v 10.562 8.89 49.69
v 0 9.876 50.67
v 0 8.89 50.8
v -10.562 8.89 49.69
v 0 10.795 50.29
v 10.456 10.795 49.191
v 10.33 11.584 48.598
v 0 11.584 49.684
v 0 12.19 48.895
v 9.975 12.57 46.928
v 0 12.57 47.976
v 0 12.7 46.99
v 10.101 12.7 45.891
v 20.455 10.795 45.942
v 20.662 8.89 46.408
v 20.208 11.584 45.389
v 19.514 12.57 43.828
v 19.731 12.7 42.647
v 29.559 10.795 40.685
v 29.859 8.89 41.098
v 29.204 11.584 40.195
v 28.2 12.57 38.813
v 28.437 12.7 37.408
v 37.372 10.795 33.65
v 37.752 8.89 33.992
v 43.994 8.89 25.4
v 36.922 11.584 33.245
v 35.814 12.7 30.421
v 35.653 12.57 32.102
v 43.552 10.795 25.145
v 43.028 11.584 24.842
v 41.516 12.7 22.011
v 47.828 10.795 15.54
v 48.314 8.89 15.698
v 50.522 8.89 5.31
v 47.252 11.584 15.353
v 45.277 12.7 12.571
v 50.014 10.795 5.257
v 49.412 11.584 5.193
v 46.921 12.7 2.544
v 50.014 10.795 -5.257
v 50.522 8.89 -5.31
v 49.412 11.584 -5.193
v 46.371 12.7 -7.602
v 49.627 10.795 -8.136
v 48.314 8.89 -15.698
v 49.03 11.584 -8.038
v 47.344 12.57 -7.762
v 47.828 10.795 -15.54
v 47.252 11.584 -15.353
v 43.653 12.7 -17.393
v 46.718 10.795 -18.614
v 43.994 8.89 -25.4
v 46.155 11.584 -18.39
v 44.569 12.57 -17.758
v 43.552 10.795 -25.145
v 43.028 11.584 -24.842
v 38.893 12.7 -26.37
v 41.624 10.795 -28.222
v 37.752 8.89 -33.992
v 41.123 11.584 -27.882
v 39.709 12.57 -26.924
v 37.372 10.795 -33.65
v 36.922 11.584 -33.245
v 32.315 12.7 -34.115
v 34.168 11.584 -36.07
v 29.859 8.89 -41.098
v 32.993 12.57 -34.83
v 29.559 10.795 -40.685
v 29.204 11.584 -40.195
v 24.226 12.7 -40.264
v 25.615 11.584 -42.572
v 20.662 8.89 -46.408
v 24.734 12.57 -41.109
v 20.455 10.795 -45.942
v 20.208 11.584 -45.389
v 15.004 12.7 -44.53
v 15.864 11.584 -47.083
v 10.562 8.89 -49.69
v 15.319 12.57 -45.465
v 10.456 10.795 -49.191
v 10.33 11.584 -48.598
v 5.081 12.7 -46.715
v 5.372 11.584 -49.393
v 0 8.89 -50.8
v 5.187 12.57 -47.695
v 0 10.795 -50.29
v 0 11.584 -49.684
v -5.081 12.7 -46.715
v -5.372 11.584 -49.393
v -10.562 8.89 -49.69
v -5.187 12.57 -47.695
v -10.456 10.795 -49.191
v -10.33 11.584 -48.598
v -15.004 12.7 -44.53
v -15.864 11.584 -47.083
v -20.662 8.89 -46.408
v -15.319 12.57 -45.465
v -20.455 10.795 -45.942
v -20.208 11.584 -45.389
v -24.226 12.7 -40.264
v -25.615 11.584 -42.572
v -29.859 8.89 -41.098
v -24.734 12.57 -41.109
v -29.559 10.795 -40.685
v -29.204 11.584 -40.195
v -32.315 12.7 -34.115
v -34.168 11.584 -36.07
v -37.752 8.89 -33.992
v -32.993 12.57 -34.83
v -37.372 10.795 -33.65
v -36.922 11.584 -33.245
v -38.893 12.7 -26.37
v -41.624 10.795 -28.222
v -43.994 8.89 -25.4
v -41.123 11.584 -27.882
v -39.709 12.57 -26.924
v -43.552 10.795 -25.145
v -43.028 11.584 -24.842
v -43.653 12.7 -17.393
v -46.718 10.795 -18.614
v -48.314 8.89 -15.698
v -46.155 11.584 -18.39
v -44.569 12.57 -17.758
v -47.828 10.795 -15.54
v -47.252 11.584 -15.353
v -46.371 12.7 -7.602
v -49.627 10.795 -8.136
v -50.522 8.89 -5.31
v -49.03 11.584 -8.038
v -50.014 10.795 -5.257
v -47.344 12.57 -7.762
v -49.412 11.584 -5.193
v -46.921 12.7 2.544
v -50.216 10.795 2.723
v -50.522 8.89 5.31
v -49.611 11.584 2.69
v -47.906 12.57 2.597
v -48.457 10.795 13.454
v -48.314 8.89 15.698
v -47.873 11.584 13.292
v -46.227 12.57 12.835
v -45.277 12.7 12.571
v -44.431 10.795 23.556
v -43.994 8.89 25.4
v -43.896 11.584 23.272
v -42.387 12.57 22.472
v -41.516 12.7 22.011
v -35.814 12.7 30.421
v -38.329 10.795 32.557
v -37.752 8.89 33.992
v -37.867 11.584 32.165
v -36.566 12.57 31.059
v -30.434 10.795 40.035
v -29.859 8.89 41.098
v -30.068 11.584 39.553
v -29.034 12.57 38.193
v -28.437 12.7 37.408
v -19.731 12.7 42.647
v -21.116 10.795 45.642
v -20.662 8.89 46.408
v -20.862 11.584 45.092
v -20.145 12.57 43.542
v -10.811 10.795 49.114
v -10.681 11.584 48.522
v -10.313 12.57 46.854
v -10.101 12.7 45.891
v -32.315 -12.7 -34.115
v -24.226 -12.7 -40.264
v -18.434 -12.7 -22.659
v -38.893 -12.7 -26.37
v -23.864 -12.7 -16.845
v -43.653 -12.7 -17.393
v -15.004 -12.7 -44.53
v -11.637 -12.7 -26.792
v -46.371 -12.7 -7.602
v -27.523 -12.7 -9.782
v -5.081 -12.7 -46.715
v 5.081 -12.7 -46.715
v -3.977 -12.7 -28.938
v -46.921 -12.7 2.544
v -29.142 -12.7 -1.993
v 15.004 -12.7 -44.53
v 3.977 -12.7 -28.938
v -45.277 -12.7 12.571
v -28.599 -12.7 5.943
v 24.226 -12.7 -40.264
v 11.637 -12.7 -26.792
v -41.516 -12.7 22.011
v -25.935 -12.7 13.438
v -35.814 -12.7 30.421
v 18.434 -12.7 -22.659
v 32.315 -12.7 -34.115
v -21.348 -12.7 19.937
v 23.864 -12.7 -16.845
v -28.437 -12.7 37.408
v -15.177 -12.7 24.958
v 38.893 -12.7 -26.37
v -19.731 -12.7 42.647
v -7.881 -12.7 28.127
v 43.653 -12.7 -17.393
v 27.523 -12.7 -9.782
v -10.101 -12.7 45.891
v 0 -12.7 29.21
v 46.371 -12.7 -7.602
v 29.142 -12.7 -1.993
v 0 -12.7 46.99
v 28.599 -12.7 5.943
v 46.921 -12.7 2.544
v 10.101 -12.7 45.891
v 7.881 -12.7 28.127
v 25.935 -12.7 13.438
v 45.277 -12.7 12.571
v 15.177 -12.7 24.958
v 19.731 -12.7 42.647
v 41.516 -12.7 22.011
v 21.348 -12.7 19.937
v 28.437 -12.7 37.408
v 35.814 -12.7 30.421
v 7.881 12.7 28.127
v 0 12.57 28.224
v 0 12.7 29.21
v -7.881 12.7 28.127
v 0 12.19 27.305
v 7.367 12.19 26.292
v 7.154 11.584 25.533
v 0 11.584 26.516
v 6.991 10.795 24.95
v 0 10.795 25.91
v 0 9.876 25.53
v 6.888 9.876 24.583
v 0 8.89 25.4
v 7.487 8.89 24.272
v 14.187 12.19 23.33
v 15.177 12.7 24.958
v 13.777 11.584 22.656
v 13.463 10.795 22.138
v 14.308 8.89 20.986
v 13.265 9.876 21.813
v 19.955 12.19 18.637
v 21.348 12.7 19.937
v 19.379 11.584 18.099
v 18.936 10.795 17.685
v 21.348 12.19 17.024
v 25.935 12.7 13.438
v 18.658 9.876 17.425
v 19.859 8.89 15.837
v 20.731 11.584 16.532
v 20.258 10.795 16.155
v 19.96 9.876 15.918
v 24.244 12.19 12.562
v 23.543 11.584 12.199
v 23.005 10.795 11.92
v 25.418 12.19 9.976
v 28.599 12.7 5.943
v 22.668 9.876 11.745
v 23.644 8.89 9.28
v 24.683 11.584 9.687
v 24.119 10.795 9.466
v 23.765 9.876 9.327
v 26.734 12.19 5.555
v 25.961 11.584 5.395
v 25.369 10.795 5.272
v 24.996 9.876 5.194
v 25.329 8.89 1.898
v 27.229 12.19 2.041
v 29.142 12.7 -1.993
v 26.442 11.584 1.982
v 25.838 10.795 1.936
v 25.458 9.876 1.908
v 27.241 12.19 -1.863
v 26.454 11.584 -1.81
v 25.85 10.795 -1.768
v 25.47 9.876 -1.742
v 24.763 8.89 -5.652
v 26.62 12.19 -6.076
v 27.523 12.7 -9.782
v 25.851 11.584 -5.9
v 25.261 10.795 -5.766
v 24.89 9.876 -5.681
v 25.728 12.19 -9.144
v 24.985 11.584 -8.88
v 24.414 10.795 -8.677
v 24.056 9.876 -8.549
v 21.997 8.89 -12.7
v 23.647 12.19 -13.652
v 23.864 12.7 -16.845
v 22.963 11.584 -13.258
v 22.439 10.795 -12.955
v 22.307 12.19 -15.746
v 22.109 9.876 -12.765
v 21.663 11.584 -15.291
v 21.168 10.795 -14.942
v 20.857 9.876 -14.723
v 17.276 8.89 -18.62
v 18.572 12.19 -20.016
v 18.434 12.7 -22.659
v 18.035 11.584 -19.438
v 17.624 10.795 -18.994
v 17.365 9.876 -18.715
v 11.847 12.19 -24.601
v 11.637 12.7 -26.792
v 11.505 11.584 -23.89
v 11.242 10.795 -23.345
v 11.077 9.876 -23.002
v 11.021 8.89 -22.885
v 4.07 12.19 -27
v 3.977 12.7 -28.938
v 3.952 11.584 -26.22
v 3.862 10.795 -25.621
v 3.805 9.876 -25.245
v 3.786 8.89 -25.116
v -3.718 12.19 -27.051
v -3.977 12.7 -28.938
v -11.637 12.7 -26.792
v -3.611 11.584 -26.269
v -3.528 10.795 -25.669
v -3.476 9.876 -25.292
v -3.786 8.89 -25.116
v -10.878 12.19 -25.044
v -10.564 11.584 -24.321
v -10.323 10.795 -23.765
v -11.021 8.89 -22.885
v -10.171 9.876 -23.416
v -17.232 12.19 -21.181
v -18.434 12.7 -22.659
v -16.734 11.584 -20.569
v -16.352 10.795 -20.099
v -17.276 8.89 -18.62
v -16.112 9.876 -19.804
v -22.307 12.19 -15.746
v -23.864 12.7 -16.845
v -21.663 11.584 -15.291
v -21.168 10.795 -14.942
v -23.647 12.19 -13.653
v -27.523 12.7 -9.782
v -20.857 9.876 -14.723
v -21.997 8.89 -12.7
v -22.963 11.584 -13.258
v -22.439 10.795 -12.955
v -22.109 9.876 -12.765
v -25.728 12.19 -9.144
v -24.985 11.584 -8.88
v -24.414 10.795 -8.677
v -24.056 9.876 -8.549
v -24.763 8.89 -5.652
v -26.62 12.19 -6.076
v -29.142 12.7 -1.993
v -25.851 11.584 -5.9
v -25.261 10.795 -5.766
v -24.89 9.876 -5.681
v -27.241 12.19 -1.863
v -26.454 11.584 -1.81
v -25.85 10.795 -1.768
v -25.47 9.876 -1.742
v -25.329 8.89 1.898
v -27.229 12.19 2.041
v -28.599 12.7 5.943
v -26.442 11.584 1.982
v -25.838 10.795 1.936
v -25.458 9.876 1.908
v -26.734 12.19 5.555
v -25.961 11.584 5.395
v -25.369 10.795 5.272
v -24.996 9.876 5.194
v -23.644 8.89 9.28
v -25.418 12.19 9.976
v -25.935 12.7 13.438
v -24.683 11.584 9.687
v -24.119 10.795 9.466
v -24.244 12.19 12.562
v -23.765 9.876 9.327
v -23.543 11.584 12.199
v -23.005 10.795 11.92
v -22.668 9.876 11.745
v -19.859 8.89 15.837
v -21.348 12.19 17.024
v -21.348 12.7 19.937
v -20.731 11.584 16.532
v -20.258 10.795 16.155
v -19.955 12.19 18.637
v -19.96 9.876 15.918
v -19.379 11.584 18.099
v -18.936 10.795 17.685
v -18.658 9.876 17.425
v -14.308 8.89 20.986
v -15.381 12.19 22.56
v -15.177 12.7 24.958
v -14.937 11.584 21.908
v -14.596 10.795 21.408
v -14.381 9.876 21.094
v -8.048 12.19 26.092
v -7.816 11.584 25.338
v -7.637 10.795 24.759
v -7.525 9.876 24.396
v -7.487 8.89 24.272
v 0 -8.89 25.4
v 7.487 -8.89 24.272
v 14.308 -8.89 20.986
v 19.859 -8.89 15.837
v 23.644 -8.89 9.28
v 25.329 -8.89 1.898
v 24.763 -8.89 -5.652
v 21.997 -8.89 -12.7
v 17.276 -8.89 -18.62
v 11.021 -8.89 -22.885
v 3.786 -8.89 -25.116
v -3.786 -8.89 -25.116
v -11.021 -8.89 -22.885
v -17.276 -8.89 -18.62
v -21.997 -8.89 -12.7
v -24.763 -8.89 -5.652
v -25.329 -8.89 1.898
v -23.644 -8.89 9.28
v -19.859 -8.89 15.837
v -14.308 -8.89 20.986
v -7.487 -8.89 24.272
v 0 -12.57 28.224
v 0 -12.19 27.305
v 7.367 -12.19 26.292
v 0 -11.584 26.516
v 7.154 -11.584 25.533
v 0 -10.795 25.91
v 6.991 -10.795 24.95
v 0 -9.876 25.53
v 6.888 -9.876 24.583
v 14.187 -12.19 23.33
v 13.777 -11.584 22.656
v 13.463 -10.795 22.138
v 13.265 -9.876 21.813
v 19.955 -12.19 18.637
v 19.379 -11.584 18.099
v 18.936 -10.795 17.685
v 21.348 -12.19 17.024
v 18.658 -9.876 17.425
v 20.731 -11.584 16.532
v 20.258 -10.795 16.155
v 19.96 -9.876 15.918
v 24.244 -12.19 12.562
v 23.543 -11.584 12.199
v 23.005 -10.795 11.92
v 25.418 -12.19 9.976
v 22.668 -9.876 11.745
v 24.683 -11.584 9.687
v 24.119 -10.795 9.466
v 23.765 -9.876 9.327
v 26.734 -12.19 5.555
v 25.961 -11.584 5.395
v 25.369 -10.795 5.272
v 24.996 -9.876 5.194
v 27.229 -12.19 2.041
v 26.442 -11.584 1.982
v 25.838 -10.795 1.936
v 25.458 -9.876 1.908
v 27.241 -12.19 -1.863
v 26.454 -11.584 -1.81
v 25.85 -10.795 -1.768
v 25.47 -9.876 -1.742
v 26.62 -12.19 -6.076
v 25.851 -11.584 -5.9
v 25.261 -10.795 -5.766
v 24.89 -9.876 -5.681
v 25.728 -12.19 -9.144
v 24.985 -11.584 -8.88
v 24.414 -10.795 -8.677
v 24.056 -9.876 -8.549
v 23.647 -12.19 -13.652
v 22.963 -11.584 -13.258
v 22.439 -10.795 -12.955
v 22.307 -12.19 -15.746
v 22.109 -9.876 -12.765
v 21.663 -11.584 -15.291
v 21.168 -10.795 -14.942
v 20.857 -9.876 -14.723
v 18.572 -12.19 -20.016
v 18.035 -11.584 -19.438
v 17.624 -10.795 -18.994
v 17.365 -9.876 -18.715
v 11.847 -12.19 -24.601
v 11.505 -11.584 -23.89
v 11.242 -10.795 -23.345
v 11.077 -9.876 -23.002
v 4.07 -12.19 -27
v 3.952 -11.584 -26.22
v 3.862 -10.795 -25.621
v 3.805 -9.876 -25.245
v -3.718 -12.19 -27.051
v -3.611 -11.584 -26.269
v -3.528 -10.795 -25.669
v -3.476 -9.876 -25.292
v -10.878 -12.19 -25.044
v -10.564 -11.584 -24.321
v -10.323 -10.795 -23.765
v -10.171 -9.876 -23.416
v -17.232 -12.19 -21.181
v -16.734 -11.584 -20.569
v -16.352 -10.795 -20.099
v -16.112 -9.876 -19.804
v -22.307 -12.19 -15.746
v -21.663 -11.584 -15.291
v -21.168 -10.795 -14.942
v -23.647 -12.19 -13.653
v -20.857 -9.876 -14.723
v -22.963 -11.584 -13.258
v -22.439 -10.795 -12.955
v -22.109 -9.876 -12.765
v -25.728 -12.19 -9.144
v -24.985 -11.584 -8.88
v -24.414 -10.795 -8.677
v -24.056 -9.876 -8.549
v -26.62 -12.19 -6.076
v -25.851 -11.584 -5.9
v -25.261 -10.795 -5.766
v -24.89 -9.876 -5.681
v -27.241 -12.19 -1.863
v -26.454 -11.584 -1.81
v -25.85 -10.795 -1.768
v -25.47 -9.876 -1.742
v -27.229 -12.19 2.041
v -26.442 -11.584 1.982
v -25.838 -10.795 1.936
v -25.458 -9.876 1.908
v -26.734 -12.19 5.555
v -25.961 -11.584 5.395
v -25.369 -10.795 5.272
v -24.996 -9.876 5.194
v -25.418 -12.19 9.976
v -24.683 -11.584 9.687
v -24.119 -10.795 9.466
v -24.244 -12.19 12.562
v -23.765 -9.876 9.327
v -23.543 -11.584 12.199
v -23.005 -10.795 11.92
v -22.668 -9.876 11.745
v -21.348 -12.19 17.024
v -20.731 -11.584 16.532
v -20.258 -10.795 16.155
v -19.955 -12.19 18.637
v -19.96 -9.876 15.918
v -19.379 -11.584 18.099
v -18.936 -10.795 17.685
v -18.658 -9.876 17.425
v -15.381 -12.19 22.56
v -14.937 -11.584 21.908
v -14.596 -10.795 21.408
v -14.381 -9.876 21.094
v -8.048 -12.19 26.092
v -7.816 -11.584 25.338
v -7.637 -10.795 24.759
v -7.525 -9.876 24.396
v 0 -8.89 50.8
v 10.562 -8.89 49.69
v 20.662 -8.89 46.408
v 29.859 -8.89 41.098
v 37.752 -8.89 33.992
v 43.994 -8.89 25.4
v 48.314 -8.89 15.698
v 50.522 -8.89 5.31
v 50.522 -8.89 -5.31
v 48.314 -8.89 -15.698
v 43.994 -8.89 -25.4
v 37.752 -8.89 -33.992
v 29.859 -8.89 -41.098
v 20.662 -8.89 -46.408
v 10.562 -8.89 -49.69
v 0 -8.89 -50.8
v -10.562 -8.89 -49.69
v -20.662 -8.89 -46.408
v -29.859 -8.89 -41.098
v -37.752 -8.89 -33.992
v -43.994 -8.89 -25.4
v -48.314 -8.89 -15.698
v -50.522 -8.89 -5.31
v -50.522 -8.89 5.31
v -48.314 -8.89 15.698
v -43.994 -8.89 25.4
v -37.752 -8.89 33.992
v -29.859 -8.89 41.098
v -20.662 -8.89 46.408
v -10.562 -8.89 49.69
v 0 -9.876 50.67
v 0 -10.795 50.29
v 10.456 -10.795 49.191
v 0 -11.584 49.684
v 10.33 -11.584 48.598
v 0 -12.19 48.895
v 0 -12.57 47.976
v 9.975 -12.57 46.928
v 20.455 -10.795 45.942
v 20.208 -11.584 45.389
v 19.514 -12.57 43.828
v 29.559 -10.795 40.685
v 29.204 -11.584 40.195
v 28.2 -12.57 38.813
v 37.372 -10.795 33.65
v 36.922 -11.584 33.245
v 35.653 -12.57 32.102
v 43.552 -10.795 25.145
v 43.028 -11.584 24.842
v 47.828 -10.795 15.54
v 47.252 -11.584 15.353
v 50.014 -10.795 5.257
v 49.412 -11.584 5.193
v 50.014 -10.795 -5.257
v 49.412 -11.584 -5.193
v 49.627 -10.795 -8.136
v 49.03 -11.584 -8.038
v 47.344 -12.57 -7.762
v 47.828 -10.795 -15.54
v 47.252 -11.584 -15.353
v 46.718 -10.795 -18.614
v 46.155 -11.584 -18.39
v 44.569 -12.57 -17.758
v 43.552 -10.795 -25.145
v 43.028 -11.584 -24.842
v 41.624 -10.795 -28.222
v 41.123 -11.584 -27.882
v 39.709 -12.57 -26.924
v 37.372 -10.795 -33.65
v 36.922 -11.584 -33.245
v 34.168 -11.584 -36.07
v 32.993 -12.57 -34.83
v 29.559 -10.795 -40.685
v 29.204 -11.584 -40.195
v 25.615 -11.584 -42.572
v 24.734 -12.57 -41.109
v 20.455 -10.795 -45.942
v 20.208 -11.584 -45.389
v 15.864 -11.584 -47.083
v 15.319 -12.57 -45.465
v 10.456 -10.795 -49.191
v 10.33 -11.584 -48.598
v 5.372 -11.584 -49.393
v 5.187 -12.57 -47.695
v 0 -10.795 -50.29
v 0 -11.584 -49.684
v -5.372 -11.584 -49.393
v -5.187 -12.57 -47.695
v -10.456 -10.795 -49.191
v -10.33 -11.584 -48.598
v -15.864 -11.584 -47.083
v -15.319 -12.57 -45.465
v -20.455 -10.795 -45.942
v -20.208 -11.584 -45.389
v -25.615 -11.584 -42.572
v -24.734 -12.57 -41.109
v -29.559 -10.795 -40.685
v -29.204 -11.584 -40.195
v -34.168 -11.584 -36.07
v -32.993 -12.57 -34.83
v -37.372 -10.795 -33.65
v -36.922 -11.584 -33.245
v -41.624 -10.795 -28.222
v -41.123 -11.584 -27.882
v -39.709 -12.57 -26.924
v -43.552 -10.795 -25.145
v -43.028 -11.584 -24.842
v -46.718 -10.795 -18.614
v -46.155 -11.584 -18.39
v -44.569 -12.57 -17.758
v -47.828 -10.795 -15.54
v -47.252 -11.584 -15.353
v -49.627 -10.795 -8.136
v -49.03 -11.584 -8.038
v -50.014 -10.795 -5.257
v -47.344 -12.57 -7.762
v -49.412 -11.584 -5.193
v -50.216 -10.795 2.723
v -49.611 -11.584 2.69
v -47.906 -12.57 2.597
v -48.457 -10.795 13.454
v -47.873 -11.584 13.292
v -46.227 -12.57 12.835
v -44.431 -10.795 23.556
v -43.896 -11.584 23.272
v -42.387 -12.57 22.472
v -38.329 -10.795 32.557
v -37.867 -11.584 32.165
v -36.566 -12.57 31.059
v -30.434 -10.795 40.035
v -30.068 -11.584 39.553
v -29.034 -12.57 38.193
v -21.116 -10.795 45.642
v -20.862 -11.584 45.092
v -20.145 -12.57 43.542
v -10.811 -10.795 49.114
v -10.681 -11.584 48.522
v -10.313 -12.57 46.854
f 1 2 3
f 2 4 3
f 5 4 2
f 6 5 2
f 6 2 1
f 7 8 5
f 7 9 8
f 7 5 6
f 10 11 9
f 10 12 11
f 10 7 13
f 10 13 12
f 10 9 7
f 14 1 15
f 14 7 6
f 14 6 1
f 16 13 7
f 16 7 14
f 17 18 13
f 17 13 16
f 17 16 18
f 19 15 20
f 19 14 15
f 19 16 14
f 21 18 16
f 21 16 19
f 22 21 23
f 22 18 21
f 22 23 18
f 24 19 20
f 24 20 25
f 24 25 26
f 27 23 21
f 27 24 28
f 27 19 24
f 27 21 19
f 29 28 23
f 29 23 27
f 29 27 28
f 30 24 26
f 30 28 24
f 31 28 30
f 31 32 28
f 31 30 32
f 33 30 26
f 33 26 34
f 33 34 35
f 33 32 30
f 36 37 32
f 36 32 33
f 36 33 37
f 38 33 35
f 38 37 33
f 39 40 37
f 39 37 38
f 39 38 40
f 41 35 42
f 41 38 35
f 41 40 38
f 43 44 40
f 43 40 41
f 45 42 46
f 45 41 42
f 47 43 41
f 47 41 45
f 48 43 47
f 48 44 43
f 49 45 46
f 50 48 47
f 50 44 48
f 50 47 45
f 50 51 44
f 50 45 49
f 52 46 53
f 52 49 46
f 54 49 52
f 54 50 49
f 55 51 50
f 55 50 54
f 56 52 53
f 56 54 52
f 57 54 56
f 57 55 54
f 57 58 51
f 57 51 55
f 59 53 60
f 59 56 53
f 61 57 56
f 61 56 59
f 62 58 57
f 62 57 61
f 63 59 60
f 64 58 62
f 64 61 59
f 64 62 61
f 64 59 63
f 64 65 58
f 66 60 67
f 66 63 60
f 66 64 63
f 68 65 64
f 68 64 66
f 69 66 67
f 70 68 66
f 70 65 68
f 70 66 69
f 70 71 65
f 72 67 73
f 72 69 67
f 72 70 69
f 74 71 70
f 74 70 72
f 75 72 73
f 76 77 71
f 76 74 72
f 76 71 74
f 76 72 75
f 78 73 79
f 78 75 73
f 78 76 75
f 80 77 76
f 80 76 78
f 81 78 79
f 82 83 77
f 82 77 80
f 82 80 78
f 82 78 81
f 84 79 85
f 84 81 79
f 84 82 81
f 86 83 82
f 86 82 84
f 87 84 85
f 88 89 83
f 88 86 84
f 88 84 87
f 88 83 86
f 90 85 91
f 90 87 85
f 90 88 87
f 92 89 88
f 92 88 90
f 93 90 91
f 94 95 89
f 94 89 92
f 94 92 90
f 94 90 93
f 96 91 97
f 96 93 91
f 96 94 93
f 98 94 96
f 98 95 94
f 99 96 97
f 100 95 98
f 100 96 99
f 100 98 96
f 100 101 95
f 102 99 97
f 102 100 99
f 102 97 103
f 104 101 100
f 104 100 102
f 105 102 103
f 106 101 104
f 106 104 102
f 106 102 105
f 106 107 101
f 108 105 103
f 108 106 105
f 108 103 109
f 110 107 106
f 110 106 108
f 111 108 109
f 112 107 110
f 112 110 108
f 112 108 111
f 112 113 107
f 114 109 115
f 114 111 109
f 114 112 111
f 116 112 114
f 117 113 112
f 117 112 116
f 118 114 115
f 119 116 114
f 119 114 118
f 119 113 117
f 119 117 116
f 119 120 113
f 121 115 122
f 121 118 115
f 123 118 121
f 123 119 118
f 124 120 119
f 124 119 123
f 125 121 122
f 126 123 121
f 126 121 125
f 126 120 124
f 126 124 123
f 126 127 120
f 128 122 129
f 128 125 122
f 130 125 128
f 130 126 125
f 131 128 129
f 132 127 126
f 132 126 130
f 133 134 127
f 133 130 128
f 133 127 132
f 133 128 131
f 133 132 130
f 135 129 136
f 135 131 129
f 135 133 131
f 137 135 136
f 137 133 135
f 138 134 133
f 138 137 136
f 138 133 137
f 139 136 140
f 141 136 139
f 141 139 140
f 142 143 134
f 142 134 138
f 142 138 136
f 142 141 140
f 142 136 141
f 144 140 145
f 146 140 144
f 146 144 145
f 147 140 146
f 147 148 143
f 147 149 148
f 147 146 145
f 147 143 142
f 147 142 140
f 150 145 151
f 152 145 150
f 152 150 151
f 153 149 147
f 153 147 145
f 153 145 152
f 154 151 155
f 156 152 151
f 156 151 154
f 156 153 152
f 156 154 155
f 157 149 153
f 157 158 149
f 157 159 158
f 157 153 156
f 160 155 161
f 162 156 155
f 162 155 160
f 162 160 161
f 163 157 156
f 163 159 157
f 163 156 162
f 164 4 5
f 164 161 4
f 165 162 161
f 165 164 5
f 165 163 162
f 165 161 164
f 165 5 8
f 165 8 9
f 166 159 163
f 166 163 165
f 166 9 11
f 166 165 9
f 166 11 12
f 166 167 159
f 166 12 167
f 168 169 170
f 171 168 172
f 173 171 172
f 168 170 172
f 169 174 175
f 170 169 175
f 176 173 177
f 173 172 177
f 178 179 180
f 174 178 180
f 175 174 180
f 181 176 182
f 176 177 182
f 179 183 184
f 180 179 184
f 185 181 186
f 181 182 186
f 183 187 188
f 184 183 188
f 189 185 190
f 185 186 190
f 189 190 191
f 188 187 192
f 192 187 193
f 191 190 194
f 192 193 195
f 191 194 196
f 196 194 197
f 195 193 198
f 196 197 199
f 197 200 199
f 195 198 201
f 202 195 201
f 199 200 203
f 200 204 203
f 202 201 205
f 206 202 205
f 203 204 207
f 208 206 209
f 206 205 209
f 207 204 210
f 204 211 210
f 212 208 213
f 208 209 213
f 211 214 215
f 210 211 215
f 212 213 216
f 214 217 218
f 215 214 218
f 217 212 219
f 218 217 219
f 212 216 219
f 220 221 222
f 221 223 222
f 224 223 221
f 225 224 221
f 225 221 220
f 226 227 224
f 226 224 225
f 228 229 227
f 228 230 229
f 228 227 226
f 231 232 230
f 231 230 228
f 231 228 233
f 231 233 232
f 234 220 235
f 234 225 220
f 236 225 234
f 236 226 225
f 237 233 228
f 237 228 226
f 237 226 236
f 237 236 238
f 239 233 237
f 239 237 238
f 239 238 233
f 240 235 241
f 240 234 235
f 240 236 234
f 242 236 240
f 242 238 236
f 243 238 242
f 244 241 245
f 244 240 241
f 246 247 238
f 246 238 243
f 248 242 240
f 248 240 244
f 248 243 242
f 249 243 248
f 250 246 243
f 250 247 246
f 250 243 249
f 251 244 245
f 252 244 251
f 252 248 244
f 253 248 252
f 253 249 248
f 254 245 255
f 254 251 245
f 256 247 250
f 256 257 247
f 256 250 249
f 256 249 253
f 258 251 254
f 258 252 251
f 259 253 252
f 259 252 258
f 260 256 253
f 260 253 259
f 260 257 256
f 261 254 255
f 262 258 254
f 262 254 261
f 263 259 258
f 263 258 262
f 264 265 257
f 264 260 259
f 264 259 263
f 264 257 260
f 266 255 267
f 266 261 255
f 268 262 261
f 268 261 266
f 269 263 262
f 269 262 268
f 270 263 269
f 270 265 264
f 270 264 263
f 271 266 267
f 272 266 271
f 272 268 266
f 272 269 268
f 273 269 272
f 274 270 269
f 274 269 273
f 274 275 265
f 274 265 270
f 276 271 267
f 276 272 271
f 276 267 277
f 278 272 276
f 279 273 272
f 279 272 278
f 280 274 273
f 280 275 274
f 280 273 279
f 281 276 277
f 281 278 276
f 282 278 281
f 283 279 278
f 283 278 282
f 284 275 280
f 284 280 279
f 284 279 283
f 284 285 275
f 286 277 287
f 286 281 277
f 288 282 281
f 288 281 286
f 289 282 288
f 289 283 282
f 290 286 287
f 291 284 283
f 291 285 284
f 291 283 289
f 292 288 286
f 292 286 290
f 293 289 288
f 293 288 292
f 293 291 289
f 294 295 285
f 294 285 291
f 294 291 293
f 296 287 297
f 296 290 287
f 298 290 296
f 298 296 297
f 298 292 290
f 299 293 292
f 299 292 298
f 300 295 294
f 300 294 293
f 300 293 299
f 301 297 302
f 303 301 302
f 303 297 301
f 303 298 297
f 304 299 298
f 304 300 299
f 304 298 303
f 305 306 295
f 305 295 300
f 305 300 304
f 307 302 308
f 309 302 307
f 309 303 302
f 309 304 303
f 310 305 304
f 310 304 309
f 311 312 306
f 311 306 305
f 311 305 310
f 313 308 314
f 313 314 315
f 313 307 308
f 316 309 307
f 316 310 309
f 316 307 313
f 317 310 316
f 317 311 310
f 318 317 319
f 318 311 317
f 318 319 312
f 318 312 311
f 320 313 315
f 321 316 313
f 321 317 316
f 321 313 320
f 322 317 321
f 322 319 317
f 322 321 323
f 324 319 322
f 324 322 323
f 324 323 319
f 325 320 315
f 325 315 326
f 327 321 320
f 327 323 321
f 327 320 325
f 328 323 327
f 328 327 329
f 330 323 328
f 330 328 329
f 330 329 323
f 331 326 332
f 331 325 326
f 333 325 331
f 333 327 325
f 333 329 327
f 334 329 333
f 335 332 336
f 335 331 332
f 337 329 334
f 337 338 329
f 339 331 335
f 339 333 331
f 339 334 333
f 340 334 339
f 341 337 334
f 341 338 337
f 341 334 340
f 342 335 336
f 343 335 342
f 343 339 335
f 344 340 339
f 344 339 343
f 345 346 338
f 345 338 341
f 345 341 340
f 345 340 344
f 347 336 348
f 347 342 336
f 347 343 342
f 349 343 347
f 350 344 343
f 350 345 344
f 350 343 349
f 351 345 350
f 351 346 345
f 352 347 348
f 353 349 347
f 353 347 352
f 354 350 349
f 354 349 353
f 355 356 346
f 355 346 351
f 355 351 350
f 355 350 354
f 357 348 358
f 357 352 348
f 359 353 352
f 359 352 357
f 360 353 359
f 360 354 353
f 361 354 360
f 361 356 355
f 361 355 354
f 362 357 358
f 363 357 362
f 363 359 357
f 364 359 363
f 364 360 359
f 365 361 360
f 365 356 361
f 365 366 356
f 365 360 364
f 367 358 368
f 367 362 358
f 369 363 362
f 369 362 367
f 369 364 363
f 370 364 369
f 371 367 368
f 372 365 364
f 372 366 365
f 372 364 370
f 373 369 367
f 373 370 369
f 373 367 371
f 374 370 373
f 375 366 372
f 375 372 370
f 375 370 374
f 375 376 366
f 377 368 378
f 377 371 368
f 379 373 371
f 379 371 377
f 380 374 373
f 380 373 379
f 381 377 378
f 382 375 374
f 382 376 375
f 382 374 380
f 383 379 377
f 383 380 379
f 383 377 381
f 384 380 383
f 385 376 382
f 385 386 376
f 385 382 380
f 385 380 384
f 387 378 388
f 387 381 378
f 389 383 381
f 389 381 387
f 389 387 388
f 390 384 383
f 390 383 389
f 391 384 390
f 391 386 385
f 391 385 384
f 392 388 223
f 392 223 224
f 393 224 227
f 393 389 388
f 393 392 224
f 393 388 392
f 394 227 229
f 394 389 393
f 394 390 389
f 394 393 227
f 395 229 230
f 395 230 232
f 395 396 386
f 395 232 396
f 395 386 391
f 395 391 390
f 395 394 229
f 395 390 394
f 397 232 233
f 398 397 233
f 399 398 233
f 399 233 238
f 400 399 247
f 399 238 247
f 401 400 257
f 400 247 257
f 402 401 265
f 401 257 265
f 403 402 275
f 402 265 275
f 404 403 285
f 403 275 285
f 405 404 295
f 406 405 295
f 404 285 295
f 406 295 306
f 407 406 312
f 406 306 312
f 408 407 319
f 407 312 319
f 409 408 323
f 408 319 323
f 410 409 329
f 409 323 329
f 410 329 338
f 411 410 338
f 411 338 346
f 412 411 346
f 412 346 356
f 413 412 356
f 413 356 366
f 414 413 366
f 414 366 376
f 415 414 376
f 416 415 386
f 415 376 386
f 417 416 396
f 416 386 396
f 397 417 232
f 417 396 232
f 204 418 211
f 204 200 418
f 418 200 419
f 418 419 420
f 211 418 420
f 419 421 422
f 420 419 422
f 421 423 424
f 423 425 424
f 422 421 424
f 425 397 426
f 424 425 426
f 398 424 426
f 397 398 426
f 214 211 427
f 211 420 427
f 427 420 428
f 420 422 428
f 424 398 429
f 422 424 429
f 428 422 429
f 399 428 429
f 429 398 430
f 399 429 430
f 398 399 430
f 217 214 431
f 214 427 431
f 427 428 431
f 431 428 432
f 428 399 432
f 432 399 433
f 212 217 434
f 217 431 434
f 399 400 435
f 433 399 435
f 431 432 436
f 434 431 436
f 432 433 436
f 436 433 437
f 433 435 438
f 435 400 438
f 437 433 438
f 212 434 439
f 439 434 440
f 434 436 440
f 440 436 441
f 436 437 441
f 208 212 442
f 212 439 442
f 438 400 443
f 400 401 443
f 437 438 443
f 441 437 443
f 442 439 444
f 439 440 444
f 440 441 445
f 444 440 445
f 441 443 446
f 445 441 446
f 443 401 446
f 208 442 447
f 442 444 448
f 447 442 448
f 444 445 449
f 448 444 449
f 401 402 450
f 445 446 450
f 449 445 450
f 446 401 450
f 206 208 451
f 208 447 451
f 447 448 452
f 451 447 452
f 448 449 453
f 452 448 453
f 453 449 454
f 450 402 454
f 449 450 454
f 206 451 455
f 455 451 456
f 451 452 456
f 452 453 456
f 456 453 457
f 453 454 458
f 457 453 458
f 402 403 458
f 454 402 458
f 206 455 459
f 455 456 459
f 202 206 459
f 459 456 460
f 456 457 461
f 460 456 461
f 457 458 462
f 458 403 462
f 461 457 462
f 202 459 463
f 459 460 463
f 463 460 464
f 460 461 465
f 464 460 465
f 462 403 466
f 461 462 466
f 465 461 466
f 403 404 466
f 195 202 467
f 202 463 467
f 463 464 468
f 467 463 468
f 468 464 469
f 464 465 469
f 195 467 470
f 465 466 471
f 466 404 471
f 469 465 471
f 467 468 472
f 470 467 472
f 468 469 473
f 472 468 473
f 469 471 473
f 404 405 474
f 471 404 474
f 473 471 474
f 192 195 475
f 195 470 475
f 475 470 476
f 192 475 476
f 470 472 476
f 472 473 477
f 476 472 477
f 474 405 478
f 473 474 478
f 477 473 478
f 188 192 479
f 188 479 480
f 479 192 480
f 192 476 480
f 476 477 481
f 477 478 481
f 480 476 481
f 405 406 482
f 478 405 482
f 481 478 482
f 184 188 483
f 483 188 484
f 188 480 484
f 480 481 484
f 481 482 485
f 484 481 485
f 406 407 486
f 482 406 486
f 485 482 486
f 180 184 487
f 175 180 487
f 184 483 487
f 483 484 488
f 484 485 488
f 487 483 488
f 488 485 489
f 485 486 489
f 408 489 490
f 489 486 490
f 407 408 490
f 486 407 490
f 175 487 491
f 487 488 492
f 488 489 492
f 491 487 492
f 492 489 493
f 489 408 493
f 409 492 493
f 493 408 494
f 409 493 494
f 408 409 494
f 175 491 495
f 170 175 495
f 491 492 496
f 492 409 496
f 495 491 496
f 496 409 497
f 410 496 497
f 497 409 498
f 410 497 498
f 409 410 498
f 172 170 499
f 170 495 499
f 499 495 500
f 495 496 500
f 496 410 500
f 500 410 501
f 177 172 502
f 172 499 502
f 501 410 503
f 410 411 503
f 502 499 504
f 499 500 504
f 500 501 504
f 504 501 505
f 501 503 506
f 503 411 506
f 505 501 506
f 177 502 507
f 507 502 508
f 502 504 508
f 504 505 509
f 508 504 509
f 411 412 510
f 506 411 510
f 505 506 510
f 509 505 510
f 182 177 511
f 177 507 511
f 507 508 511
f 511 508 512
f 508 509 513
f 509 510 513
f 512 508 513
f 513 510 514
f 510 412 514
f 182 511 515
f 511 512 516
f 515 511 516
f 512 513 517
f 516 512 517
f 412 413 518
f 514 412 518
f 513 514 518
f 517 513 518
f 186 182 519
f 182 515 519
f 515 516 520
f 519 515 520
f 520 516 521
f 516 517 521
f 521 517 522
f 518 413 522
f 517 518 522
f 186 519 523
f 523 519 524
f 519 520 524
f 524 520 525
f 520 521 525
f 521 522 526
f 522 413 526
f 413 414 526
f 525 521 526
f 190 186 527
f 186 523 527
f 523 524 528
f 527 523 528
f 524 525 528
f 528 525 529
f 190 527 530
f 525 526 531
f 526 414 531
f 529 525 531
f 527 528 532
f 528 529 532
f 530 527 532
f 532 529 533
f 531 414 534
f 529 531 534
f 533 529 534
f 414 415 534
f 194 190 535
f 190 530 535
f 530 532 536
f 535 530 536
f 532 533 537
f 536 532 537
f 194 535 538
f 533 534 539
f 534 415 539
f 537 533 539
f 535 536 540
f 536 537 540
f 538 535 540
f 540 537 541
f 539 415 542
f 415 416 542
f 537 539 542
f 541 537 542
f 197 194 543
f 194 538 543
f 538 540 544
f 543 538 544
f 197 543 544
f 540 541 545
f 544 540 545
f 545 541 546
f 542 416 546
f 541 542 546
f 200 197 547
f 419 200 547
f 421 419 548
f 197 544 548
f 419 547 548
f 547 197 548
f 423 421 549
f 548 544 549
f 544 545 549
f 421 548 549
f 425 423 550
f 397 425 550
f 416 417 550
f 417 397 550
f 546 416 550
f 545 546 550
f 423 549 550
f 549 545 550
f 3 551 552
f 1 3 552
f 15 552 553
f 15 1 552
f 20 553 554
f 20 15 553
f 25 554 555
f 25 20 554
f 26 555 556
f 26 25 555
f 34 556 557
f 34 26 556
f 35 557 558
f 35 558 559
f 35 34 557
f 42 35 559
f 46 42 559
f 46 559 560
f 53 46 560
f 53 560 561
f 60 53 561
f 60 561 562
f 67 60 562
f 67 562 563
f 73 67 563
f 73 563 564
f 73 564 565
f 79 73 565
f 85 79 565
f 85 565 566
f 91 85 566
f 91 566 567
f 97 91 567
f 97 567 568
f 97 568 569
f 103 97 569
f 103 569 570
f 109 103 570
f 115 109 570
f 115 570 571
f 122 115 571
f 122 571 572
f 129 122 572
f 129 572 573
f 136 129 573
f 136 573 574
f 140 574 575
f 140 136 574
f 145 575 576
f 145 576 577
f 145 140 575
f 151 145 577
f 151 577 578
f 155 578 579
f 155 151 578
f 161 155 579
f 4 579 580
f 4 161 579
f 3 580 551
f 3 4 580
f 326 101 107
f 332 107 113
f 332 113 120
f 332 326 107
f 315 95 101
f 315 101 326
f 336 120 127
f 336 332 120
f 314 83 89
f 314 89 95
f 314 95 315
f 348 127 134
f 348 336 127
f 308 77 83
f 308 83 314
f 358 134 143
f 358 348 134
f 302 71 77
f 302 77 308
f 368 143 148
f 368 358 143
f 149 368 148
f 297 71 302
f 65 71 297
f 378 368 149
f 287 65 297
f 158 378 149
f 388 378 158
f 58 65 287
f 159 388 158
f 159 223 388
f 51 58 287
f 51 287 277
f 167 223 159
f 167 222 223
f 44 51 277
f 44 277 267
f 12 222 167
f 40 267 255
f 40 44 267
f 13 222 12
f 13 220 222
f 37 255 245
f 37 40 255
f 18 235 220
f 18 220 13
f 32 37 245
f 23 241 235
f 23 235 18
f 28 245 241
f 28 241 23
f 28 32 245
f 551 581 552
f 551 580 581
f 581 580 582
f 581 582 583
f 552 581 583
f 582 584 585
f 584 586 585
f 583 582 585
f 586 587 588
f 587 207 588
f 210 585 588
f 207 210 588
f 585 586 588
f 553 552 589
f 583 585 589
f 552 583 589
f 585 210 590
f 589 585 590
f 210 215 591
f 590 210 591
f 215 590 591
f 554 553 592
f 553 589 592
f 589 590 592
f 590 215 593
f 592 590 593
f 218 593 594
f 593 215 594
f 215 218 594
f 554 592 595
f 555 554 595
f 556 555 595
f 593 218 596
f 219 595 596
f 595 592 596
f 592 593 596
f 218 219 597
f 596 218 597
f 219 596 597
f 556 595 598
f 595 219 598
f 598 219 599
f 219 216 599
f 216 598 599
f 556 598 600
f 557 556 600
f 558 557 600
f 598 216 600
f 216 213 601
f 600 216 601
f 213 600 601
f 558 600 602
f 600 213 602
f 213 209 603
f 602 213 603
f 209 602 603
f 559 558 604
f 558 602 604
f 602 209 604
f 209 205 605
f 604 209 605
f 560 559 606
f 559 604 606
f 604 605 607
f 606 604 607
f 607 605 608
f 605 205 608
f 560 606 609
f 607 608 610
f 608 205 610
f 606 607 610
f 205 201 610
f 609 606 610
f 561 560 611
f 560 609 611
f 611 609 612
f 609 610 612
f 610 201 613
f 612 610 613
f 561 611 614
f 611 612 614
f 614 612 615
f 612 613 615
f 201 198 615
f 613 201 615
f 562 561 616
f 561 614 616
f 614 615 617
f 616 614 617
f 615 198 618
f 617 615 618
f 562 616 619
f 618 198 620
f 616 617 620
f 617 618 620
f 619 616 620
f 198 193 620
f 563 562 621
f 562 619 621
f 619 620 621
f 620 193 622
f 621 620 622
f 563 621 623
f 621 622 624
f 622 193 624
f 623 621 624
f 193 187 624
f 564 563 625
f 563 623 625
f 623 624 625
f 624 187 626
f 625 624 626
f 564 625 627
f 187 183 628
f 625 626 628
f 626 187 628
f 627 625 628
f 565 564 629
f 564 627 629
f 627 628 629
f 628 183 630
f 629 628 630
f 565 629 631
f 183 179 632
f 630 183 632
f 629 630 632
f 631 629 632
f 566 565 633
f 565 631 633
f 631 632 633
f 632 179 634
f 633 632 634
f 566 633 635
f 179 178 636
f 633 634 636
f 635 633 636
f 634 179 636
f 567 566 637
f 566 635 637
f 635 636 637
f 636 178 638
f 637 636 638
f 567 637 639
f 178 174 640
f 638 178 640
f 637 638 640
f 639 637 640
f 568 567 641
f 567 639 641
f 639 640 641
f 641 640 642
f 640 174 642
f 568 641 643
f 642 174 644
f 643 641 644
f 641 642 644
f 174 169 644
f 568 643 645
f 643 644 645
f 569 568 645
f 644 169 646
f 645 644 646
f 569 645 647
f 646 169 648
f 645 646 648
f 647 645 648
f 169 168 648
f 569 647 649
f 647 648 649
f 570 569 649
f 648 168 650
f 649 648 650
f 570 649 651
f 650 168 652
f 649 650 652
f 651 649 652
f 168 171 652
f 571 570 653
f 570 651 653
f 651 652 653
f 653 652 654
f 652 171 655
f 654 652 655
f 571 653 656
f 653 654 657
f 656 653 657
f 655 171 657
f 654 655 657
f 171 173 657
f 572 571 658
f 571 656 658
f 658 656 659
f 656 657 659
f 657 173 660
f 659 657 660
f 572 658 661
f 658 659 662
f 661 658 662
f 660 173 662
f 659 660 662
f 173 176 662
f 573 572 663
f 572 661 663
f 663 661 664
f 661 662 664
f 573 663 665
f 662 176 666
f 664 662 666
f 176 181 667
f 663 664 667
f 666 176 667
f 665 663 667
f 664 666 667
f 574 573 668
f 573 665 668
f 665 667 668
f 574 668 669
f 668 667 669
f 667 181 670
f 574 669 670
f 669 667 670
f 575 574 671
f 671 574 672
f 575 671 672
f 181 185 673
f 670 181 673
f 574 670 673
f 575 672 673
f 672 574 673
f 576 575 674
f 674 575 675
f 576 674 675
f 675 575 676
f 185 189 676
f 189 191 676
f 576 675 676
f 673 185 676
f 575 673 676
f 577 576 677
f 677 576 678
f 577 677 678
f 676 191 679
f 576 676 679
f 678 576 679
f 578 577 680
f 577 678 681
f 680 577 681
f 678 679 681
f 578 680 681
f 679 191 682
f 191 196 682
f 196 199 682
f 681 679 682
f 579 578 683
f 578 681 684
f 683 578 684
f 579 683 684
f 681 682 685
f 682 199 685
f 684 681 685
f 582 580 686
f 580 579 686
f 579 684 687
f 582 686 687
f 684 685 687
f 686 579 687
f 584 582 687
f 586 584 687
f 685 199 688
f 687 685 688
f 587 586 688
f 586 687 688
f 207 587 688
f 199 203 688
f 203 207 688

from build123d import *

# Parameters (mm, degrees)
SKETCH2_R           = 50.8
BOSS_EXTRUDE3_DEPTH = 12.7
SKETCH4_R           = 25.4
CUT_EXTRUDE1_DEPTH  = 13.97
FILLET1_R           = 3.81
FILLET2_R           = 3.81
FILLET3_R           = 3.81
FILLET4_R           = 3.81


with BuildPart() as part:
    # Sketch2 → Boss-Extrude3 (new, symmetric)
    with BuildSketch(Plane(origin=(0, 0, 0), x_dir=(1, 0, 0), z_dir=(0, 1, 0))):
        with Locations(Location((0, 0, 0), (0, 0, 270))):
            Circle(SKETCH2_R)
    extrude(amount=BOSS_EXTRUDE3_DEPTH, both=True)

    # Sketch4 → Cut-Extrude1 (cut, symmetric)
    with BuildSketch(Plane(origin=(0, 0, 0), x_dir=(1, 0, 0), z_dir=(0, 1, 0))):
        with Locations(Location((0, 0, 0), (0, 0, 270))):
            Circle(SKETCH4_R)
    extrude(amount=CUT_EXTRUDE1_DEPTH, both=True, mode=Mode.SUBTRACT)

    # Fillet1
    fillet1_edges = [part.edges().sort_by_distance(p)[0] for p in [
        (0, -12.7, -50.8),
    ]]
    fillet(fillet1_edges, radius=FILLET1_R)

    # Fillet2
    fillet2_edges = [part.edges().sort_by_distance(p)[0] for p in [
        (0, -12.7, -25.4),
    ]]
    fillet(fillet2_edges, radius=FILLET2_R)

    # Fillet3
    fillet3_edges = [part.edges().sort_by_distance(p)[0] for p in [
        (0, 12.7, -50.8),
    ]]
    fillet(fillet3_edges, radius=FILLET3_R)

    # Fillet4
    fillet4_edges = [part.edges().sort_by_distance(p)[0] for p in [
        (0, 12.7, -25.4),
    ]]
    fillet(fillet4_edges, radius=FILLET4_R)


solid = part.part
